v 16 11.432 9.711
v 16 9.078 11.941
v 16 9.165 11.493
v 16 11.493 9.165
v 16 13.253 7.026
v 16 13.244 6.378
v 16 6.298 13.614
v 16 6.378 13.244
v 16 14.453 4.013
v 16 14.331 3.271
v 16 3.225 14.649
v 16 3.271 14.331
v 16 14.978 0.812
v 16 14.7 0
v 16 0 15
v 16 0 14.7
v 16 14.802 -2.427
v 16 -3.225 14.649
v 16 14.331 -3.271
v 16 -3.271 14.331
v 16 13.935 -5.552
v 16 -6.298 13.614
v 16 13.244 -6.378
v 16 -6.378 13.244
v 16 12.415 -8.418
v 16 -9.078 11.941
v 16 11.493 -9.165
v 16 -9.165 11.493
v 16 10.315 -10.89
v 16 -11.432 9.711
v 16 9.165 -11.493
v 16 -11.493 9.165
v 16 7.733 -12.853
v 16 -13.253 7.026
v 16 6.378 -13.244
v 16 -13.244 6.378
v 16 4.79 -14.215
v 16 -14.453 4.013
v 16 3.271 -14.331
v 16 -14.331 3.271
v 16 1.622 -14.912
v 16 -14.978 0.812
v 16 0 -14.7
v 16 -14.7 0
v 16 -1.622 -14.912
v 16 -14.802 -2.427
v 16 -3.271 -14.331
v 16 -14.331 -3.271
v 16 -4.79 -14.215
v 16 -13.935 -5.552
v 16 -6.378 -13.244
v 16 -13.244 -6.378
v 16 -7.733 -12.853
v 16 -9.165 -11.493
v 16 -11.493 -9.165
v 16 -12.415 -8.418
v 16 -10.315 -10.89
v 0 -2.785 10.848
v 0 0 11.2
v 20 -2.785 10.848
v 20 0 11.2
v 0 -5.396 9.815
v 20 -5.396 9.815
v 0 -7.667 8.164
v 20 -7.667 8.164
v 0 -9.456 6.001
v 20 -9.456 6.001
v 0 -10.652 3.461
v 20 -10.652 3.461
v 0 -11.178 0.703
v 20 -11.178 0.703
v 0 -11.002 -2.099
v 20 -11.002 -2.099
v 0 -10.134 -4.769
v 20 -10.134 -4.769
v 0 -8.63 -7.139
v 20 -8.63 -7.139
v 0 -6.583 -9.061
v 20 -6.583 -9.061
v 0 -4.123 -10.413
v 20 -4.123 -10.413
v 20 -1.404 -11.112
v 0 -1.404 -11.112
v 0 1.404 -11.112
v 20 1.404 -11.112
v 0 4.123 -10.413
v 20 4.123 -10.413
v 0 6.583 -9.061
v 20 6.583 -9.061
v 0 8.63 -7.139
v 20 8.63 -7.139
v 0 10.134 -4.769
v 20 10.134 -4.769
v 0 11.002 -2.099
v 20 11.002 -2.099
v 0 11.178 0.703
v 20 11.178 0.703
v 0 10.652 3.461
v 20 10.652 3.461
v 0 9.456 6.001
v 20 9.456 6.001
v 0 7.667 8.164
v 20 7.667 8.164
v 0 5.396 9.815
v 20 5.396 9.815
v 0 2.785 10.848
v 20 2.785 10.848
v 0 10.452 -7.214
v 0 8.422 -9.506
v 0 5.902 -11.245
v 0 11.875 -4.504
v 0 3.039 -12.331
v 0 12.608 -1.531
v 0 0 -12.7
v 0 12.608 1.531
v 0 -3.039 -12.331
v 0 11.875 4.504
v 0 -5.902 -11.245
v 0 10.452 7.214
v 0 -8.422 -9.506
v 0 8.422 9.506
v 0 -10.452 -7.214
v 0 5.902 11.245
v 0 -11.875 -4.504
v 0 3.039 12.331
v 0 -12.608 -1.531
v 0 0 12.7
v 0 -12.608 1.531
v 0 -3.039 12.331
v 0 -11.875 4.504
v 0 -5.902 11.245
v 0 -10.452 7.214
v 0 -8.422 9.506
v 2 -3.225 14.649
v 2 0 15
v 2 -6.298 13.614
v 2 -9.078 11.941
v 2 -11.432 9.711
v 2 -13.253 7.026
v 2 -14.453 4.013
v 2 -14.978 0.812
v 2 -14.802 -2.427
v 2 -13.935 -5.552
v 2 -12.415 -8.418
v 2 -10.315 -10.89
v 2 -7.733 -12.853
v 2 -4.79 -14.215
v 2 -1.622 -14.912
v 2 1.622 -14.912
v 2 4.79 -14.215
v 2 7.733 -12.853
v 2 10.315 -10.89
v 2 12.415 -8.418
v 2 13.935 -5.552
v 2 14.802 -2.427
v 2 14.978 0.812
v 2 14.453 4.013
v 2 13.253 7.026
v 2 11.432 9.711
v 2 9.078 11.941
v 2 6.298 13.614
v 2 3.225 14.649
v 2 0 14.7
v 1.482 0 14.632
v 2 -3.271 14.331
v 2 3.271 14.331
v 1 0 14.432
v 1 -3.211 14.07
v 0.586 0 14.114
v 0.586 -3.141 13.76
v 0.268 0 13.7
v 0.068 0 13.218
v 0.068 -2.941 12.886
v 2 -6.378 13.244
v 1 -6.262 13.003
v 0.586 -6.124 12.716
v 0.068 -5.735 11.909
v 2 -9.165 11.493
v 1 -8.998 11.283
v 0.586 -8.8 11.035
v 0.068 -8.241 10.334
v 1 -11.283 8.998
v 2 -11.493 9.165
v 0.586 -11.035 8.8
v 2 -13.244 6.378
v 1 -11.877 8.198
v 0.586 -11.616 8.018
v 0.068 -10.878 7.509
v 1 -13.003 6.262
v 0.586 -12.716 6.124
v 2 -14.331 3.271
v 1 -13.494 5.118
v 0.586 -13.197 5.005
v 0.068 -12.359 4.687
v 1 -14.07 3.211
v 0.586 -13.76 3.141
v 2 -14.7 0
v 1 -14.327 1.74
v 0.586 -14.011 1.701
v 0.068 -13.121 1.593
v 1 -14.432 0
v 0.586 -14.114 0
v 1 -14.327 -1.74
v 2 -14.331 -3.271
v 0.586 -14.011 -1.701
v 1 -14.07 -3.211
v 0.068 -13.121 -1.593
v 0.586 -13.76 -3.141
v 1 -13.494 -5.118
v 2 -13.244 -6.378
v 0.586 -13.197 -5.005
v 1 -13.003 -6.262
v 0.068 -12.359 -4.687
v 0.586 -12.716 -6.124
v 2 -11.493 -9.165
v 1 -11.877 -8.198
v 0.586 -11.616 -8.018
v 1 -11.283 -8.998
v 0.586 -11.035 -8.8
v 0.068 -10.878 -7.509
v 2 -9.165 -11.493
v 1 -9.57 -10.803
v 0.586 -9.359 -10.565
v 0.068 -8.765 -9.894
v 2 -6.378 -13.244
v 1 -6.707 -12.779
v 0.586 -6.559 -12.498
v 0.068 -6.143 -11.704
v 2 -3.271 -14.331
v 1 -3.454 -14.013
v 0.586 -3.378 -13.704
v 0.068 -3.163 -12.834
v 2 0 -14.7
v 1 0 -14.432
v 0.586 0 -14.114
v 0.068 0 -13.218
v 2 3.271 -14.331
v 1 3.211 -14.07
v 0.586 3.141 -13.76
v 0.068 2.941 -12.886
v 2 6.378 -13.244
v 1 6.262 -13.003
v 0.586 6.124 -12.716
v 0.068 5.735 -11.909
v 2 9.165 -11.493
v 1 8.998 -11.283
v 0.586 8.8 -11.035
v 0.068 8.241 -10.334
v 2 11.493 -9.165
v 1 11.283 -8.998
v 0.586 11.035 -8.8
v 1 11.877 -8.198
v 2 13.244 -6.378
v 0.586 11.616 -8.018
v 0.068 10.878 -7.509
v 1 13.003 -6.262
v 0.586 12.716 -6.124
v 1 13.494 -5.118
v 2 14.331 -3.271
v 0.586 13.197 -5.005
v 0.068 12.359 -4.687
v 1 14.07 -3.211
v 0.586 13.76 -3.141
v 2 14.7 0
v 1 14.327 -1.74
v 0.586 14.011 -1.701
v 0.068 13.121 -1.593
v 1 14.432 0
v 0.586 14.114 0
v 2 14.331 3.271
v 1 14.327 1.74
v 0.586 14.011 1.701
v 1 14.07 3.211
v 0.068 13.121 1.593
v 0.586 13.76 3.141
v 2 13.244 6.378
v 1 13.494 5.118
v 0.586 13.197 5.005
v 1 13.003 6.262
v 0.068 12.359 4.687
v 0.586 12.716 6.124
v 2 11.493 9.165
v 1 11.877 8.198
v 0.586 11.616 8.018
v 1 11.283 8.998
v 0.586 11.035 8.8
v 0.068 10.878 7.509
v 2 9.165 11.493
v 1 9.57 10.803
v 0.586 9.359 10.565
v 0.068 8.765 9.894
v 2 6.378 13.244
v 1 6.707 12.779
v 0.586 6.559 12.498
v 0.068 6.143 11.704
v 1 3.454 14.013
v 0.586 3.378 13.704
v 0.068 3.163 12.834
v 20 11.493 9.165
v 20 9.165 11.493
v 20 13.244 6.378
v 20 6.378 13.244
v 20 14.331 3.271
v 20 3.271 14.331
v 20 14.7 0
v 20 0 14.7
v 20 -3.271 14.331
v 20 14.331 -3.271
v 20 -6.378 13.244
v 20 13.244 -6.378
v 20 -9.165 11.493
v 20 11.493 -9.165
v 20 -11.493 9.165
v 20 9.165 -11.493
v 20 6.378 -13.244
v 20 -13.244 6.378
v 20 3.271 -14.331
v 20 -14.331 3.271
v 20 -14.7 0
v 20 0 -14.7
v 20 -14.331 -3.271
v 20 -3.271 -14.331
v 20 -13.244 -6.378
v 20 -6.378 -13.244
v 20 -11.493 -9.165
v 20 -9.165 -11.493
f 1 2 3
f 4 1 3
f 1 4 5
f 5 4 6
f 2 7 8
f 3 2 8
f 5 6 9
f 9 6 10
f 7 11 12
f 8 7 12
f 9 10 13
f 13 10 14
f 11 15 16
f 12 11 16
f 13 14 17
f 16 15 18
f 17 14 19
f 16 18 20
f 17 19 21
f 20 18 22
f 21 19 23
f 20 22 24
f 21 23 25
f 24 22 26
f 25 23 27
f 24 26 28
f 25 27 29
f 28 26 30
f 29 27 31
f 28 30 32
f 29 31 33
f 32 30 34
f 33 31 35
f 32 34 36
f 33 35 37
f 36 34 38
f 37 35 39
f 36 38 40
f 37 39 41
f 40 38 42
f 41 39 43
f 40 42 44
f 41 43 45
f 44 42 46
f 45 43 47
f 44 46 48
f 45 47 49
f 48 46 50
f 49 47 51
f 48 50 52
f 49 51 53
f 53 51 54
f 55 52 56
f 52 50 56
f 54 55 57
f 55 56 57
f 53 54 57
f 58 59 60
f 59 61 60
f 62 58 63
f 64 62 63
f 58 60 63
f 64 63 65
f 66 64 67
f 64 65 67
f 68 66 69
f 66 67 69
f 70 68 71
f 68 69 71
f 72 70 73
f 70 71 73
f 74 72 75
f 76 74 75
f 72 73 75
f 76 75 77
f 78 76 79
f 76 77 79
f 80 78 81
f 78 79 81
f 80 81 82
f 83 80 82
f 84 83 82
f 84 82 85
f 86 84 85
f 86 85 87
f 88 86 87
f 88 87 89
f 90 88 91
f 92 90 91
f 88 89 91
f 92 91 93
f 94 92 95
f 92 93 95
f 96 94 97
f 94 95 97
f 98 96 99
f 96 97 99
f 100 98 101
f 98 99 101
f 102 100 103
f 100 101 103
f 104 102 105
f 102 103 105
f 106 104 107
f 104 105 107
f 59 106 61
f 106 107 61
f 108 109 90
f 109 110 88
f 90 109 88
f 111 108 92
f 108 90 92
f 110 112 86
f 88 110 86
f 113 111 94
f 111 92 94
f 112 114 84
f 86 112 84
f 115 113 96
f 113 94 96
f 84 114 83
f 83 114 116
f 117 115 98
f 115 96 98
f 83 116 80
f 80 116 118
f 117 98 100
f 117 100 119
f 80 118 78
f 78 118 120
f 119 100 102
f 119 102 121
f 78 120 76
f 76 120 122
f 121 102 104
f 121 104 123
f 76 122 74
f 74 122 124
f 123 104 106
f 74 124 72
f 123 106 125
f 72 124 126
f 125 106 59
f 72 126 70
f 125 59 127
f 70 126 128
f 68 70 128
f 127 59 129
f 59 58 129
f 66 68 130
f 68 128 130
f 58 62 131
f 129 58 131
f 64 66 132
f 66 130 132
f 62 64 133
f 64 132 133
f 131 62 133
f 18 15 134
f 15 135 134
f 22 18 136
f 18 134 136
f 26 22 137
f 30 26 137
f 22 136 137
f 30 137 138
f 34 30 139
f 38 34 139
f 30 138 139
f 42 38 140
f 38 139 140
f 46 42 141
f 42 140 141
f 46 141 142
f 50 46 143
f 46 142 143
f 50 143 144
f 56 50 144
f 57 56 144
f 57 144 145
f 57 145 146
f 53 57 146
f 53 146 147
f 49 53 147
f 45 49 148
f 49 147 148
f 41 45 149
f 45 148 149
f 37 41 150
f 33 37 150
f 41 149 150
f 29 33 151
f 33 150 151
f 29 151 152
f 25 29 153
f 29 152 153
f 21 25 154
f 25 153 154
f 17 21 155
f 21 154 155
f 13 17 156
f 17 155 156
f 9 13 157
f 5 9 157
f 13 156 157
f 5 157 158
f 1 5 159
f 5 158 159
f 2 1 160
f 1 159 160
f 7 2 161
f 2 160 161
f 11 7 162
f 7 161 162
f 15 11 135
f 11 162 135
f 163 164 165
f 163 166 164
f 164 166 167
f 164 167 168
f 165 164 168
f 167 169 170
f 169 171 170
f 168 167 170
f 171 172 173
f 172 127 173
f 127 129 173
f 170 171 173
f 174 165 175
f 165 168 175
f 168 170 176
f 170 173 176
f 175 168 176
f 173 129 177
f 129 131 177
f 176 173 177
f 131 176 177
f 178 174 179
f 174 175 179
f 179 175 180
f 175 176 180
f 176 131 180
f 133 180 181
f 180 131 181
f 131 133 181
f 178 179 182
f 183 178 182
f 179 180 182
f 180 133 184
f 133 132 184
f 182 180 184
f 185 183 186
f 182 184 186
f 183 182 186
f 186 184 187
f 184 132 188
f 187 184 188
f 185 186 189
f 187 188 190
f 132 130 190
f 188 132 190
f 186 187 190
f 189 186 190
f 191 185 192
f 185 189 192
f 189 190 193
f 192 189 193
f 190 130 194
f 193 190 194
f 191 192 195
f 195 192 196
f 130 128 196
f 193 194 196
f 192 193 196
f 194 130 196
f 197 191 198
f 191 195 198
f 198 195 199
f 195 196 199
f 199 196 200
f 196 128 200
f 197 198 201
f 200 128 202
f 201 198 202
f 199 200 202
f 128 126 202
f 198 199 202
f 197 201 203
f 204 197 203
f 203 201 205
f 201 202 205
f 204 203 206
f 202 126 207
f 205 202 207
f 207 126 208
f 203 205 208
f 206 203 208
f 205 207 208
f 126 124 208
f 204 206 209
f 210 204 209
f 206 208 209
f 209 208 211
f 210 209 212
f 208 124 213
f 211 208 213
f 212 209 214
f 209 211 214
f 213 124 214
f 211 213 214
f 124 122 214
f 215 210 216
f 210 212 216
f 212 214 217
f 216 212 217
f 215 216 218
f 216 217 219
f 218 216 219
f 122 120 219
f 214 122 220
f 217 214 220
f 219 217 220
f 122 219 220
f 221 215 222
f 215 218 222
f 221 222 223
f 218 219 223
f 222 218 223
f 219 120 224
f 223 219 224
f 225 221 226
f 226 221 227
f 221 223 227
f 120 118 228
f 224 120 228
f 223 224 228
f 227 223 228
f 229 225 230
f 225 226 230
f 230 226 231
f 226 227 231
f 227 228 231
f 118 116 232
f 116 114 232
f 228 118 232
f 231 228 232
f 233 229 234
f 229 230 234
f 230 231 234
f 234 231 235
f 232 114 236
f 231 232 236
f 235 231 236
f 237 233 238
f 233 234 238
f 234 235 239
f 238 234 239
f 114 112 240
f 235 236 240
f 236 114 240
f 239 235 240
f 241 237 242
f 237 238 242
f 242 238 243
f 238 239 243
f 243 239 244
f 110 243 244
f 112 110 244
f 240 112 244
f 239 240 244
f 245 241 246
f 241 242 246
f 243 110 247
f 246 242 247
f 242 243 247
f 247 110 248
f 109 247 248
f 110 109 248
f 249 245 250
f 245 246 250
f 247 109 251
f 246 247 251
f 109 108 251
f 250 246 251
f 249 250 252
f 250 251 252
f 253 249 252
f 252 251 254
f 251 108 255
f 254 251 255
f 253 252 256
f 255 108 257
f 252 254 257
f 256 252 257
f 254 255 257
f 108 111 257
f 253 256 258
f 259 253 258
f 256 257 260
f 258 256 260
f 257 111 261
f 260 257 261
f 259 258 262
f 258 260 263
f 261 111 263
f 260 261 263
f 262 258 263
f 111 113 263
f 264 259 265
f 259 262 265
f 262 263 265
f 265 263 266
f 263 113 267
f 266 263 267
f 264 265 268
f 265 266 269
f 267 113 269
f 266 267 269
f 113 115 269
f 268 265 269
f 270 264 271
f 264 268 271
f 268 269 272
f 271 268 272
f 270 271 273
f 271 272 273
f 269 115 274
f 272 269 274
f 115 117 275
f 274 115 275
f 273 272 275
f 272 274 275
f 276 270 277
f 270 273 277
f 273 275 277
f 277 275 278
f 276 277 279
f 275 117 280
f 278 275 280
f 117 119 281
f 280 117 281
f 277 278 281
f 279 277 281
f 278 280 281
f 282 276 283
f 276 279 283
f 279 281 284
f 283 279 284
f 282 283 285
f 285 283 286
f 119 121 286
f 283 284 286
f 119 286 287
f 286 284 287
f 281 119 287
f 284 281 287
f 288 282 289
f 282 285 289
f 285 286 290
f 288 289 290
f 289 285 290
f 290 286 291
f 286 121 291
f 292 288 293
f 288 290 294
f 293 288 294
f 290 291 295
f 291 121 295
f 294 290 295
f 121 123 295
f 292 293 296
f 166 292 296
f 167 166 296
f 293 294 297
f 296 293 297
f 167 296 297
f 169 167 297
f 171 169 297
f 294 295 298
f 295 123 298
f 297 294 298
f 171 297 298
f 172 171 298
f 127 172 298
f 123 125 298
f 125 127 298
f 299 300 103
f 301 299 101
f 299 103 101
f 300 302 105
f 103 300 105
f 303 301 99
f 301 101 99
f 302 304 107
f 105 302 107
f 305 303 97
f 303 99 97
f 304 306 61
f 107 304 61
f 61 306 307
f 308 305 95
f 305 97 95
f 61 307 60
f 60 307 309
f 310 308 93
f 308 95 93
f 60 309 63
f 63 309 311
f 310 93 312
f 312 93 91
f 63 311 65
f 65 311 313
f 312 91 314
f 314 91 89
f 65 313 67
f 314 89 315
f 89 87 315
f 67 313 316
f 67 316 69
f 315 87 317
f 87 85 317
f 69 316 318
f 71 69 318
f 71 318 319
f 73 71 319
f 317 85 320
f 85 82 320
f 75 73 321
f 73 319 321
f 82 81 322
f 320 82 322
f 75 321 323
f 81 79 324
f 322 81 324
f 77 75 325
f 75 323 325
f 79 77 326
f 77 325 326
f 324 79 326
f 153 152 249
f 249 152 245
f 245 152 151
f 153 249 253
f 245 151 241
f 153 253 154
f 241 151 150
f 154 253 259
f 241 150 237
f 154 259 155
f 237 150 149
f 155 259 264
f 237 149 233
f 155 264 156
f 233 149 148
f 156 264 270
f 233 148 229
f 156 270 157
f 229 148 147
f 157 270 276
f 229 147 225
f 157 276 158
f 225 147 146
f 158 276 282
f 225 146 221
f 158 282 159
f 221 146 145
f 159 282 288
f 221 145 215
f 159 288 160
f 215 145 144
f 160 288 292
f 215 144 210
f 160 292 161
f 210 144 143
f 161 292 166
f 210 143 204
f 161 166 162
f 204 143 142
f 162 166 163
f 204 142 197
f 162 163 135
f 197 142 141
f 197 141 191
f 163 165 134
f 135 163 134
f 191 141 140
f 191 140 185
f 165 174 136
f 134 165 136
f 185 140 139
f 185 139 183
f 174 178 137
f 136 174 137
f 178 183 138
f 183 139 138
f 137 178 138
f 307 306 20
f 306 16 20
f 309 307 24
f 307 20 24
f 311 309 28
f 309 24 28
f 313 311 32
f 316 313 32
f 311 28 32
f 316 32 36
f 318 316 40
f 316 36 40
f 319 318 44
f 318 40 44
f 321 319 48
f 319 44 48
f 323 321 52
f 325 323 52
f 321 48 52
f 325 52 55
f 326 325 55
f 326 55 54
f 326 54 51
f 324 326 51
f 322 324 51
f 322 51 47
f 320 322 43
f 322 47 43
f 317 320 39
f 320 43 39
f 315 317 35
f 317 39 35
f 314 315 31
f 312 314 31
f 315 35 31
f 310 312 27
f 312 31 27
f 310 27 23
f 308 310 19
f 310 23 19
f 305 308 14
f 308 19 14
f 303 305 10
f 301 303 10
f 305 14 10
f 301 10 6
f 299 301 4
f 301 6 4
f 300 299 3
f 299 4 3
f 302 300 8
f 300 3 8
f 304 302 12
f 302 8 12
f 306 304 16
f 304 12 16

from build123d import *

# Parameters (mm, degrees)
FILLET_1_R = 2


with BuildPart() as part:
    # Эскиз1 → Повернуть1 (revolve)
    with BuildSketch(Plane.XY, mode=Mode.PRIVATE) as revolve_1_sk:
        Polygon((0, 11.2), (20, 11.2), (20, 14.7), (16, 14.7), (16, 15), (2, 15), (2, 14.7), (0, 14.7), align=None)
    revolve(revolve_1_sk.sketch.rotate(Axis((0, 0, 0), (1, 0, 0)), 90), axis=Axis((0, 0, 0), (1, 0, 0)))

    # Скругление1
    fillet_1_edges = [part.edges().sort_by_distance(p)[0] for p in [
        (0, 0, -14.7),
    ]]
    fillet(fillet_1_edges, radius=FILLET_1_R - 0.0001)  # a hair under: the kernel refuses the full size


solid = part.part
